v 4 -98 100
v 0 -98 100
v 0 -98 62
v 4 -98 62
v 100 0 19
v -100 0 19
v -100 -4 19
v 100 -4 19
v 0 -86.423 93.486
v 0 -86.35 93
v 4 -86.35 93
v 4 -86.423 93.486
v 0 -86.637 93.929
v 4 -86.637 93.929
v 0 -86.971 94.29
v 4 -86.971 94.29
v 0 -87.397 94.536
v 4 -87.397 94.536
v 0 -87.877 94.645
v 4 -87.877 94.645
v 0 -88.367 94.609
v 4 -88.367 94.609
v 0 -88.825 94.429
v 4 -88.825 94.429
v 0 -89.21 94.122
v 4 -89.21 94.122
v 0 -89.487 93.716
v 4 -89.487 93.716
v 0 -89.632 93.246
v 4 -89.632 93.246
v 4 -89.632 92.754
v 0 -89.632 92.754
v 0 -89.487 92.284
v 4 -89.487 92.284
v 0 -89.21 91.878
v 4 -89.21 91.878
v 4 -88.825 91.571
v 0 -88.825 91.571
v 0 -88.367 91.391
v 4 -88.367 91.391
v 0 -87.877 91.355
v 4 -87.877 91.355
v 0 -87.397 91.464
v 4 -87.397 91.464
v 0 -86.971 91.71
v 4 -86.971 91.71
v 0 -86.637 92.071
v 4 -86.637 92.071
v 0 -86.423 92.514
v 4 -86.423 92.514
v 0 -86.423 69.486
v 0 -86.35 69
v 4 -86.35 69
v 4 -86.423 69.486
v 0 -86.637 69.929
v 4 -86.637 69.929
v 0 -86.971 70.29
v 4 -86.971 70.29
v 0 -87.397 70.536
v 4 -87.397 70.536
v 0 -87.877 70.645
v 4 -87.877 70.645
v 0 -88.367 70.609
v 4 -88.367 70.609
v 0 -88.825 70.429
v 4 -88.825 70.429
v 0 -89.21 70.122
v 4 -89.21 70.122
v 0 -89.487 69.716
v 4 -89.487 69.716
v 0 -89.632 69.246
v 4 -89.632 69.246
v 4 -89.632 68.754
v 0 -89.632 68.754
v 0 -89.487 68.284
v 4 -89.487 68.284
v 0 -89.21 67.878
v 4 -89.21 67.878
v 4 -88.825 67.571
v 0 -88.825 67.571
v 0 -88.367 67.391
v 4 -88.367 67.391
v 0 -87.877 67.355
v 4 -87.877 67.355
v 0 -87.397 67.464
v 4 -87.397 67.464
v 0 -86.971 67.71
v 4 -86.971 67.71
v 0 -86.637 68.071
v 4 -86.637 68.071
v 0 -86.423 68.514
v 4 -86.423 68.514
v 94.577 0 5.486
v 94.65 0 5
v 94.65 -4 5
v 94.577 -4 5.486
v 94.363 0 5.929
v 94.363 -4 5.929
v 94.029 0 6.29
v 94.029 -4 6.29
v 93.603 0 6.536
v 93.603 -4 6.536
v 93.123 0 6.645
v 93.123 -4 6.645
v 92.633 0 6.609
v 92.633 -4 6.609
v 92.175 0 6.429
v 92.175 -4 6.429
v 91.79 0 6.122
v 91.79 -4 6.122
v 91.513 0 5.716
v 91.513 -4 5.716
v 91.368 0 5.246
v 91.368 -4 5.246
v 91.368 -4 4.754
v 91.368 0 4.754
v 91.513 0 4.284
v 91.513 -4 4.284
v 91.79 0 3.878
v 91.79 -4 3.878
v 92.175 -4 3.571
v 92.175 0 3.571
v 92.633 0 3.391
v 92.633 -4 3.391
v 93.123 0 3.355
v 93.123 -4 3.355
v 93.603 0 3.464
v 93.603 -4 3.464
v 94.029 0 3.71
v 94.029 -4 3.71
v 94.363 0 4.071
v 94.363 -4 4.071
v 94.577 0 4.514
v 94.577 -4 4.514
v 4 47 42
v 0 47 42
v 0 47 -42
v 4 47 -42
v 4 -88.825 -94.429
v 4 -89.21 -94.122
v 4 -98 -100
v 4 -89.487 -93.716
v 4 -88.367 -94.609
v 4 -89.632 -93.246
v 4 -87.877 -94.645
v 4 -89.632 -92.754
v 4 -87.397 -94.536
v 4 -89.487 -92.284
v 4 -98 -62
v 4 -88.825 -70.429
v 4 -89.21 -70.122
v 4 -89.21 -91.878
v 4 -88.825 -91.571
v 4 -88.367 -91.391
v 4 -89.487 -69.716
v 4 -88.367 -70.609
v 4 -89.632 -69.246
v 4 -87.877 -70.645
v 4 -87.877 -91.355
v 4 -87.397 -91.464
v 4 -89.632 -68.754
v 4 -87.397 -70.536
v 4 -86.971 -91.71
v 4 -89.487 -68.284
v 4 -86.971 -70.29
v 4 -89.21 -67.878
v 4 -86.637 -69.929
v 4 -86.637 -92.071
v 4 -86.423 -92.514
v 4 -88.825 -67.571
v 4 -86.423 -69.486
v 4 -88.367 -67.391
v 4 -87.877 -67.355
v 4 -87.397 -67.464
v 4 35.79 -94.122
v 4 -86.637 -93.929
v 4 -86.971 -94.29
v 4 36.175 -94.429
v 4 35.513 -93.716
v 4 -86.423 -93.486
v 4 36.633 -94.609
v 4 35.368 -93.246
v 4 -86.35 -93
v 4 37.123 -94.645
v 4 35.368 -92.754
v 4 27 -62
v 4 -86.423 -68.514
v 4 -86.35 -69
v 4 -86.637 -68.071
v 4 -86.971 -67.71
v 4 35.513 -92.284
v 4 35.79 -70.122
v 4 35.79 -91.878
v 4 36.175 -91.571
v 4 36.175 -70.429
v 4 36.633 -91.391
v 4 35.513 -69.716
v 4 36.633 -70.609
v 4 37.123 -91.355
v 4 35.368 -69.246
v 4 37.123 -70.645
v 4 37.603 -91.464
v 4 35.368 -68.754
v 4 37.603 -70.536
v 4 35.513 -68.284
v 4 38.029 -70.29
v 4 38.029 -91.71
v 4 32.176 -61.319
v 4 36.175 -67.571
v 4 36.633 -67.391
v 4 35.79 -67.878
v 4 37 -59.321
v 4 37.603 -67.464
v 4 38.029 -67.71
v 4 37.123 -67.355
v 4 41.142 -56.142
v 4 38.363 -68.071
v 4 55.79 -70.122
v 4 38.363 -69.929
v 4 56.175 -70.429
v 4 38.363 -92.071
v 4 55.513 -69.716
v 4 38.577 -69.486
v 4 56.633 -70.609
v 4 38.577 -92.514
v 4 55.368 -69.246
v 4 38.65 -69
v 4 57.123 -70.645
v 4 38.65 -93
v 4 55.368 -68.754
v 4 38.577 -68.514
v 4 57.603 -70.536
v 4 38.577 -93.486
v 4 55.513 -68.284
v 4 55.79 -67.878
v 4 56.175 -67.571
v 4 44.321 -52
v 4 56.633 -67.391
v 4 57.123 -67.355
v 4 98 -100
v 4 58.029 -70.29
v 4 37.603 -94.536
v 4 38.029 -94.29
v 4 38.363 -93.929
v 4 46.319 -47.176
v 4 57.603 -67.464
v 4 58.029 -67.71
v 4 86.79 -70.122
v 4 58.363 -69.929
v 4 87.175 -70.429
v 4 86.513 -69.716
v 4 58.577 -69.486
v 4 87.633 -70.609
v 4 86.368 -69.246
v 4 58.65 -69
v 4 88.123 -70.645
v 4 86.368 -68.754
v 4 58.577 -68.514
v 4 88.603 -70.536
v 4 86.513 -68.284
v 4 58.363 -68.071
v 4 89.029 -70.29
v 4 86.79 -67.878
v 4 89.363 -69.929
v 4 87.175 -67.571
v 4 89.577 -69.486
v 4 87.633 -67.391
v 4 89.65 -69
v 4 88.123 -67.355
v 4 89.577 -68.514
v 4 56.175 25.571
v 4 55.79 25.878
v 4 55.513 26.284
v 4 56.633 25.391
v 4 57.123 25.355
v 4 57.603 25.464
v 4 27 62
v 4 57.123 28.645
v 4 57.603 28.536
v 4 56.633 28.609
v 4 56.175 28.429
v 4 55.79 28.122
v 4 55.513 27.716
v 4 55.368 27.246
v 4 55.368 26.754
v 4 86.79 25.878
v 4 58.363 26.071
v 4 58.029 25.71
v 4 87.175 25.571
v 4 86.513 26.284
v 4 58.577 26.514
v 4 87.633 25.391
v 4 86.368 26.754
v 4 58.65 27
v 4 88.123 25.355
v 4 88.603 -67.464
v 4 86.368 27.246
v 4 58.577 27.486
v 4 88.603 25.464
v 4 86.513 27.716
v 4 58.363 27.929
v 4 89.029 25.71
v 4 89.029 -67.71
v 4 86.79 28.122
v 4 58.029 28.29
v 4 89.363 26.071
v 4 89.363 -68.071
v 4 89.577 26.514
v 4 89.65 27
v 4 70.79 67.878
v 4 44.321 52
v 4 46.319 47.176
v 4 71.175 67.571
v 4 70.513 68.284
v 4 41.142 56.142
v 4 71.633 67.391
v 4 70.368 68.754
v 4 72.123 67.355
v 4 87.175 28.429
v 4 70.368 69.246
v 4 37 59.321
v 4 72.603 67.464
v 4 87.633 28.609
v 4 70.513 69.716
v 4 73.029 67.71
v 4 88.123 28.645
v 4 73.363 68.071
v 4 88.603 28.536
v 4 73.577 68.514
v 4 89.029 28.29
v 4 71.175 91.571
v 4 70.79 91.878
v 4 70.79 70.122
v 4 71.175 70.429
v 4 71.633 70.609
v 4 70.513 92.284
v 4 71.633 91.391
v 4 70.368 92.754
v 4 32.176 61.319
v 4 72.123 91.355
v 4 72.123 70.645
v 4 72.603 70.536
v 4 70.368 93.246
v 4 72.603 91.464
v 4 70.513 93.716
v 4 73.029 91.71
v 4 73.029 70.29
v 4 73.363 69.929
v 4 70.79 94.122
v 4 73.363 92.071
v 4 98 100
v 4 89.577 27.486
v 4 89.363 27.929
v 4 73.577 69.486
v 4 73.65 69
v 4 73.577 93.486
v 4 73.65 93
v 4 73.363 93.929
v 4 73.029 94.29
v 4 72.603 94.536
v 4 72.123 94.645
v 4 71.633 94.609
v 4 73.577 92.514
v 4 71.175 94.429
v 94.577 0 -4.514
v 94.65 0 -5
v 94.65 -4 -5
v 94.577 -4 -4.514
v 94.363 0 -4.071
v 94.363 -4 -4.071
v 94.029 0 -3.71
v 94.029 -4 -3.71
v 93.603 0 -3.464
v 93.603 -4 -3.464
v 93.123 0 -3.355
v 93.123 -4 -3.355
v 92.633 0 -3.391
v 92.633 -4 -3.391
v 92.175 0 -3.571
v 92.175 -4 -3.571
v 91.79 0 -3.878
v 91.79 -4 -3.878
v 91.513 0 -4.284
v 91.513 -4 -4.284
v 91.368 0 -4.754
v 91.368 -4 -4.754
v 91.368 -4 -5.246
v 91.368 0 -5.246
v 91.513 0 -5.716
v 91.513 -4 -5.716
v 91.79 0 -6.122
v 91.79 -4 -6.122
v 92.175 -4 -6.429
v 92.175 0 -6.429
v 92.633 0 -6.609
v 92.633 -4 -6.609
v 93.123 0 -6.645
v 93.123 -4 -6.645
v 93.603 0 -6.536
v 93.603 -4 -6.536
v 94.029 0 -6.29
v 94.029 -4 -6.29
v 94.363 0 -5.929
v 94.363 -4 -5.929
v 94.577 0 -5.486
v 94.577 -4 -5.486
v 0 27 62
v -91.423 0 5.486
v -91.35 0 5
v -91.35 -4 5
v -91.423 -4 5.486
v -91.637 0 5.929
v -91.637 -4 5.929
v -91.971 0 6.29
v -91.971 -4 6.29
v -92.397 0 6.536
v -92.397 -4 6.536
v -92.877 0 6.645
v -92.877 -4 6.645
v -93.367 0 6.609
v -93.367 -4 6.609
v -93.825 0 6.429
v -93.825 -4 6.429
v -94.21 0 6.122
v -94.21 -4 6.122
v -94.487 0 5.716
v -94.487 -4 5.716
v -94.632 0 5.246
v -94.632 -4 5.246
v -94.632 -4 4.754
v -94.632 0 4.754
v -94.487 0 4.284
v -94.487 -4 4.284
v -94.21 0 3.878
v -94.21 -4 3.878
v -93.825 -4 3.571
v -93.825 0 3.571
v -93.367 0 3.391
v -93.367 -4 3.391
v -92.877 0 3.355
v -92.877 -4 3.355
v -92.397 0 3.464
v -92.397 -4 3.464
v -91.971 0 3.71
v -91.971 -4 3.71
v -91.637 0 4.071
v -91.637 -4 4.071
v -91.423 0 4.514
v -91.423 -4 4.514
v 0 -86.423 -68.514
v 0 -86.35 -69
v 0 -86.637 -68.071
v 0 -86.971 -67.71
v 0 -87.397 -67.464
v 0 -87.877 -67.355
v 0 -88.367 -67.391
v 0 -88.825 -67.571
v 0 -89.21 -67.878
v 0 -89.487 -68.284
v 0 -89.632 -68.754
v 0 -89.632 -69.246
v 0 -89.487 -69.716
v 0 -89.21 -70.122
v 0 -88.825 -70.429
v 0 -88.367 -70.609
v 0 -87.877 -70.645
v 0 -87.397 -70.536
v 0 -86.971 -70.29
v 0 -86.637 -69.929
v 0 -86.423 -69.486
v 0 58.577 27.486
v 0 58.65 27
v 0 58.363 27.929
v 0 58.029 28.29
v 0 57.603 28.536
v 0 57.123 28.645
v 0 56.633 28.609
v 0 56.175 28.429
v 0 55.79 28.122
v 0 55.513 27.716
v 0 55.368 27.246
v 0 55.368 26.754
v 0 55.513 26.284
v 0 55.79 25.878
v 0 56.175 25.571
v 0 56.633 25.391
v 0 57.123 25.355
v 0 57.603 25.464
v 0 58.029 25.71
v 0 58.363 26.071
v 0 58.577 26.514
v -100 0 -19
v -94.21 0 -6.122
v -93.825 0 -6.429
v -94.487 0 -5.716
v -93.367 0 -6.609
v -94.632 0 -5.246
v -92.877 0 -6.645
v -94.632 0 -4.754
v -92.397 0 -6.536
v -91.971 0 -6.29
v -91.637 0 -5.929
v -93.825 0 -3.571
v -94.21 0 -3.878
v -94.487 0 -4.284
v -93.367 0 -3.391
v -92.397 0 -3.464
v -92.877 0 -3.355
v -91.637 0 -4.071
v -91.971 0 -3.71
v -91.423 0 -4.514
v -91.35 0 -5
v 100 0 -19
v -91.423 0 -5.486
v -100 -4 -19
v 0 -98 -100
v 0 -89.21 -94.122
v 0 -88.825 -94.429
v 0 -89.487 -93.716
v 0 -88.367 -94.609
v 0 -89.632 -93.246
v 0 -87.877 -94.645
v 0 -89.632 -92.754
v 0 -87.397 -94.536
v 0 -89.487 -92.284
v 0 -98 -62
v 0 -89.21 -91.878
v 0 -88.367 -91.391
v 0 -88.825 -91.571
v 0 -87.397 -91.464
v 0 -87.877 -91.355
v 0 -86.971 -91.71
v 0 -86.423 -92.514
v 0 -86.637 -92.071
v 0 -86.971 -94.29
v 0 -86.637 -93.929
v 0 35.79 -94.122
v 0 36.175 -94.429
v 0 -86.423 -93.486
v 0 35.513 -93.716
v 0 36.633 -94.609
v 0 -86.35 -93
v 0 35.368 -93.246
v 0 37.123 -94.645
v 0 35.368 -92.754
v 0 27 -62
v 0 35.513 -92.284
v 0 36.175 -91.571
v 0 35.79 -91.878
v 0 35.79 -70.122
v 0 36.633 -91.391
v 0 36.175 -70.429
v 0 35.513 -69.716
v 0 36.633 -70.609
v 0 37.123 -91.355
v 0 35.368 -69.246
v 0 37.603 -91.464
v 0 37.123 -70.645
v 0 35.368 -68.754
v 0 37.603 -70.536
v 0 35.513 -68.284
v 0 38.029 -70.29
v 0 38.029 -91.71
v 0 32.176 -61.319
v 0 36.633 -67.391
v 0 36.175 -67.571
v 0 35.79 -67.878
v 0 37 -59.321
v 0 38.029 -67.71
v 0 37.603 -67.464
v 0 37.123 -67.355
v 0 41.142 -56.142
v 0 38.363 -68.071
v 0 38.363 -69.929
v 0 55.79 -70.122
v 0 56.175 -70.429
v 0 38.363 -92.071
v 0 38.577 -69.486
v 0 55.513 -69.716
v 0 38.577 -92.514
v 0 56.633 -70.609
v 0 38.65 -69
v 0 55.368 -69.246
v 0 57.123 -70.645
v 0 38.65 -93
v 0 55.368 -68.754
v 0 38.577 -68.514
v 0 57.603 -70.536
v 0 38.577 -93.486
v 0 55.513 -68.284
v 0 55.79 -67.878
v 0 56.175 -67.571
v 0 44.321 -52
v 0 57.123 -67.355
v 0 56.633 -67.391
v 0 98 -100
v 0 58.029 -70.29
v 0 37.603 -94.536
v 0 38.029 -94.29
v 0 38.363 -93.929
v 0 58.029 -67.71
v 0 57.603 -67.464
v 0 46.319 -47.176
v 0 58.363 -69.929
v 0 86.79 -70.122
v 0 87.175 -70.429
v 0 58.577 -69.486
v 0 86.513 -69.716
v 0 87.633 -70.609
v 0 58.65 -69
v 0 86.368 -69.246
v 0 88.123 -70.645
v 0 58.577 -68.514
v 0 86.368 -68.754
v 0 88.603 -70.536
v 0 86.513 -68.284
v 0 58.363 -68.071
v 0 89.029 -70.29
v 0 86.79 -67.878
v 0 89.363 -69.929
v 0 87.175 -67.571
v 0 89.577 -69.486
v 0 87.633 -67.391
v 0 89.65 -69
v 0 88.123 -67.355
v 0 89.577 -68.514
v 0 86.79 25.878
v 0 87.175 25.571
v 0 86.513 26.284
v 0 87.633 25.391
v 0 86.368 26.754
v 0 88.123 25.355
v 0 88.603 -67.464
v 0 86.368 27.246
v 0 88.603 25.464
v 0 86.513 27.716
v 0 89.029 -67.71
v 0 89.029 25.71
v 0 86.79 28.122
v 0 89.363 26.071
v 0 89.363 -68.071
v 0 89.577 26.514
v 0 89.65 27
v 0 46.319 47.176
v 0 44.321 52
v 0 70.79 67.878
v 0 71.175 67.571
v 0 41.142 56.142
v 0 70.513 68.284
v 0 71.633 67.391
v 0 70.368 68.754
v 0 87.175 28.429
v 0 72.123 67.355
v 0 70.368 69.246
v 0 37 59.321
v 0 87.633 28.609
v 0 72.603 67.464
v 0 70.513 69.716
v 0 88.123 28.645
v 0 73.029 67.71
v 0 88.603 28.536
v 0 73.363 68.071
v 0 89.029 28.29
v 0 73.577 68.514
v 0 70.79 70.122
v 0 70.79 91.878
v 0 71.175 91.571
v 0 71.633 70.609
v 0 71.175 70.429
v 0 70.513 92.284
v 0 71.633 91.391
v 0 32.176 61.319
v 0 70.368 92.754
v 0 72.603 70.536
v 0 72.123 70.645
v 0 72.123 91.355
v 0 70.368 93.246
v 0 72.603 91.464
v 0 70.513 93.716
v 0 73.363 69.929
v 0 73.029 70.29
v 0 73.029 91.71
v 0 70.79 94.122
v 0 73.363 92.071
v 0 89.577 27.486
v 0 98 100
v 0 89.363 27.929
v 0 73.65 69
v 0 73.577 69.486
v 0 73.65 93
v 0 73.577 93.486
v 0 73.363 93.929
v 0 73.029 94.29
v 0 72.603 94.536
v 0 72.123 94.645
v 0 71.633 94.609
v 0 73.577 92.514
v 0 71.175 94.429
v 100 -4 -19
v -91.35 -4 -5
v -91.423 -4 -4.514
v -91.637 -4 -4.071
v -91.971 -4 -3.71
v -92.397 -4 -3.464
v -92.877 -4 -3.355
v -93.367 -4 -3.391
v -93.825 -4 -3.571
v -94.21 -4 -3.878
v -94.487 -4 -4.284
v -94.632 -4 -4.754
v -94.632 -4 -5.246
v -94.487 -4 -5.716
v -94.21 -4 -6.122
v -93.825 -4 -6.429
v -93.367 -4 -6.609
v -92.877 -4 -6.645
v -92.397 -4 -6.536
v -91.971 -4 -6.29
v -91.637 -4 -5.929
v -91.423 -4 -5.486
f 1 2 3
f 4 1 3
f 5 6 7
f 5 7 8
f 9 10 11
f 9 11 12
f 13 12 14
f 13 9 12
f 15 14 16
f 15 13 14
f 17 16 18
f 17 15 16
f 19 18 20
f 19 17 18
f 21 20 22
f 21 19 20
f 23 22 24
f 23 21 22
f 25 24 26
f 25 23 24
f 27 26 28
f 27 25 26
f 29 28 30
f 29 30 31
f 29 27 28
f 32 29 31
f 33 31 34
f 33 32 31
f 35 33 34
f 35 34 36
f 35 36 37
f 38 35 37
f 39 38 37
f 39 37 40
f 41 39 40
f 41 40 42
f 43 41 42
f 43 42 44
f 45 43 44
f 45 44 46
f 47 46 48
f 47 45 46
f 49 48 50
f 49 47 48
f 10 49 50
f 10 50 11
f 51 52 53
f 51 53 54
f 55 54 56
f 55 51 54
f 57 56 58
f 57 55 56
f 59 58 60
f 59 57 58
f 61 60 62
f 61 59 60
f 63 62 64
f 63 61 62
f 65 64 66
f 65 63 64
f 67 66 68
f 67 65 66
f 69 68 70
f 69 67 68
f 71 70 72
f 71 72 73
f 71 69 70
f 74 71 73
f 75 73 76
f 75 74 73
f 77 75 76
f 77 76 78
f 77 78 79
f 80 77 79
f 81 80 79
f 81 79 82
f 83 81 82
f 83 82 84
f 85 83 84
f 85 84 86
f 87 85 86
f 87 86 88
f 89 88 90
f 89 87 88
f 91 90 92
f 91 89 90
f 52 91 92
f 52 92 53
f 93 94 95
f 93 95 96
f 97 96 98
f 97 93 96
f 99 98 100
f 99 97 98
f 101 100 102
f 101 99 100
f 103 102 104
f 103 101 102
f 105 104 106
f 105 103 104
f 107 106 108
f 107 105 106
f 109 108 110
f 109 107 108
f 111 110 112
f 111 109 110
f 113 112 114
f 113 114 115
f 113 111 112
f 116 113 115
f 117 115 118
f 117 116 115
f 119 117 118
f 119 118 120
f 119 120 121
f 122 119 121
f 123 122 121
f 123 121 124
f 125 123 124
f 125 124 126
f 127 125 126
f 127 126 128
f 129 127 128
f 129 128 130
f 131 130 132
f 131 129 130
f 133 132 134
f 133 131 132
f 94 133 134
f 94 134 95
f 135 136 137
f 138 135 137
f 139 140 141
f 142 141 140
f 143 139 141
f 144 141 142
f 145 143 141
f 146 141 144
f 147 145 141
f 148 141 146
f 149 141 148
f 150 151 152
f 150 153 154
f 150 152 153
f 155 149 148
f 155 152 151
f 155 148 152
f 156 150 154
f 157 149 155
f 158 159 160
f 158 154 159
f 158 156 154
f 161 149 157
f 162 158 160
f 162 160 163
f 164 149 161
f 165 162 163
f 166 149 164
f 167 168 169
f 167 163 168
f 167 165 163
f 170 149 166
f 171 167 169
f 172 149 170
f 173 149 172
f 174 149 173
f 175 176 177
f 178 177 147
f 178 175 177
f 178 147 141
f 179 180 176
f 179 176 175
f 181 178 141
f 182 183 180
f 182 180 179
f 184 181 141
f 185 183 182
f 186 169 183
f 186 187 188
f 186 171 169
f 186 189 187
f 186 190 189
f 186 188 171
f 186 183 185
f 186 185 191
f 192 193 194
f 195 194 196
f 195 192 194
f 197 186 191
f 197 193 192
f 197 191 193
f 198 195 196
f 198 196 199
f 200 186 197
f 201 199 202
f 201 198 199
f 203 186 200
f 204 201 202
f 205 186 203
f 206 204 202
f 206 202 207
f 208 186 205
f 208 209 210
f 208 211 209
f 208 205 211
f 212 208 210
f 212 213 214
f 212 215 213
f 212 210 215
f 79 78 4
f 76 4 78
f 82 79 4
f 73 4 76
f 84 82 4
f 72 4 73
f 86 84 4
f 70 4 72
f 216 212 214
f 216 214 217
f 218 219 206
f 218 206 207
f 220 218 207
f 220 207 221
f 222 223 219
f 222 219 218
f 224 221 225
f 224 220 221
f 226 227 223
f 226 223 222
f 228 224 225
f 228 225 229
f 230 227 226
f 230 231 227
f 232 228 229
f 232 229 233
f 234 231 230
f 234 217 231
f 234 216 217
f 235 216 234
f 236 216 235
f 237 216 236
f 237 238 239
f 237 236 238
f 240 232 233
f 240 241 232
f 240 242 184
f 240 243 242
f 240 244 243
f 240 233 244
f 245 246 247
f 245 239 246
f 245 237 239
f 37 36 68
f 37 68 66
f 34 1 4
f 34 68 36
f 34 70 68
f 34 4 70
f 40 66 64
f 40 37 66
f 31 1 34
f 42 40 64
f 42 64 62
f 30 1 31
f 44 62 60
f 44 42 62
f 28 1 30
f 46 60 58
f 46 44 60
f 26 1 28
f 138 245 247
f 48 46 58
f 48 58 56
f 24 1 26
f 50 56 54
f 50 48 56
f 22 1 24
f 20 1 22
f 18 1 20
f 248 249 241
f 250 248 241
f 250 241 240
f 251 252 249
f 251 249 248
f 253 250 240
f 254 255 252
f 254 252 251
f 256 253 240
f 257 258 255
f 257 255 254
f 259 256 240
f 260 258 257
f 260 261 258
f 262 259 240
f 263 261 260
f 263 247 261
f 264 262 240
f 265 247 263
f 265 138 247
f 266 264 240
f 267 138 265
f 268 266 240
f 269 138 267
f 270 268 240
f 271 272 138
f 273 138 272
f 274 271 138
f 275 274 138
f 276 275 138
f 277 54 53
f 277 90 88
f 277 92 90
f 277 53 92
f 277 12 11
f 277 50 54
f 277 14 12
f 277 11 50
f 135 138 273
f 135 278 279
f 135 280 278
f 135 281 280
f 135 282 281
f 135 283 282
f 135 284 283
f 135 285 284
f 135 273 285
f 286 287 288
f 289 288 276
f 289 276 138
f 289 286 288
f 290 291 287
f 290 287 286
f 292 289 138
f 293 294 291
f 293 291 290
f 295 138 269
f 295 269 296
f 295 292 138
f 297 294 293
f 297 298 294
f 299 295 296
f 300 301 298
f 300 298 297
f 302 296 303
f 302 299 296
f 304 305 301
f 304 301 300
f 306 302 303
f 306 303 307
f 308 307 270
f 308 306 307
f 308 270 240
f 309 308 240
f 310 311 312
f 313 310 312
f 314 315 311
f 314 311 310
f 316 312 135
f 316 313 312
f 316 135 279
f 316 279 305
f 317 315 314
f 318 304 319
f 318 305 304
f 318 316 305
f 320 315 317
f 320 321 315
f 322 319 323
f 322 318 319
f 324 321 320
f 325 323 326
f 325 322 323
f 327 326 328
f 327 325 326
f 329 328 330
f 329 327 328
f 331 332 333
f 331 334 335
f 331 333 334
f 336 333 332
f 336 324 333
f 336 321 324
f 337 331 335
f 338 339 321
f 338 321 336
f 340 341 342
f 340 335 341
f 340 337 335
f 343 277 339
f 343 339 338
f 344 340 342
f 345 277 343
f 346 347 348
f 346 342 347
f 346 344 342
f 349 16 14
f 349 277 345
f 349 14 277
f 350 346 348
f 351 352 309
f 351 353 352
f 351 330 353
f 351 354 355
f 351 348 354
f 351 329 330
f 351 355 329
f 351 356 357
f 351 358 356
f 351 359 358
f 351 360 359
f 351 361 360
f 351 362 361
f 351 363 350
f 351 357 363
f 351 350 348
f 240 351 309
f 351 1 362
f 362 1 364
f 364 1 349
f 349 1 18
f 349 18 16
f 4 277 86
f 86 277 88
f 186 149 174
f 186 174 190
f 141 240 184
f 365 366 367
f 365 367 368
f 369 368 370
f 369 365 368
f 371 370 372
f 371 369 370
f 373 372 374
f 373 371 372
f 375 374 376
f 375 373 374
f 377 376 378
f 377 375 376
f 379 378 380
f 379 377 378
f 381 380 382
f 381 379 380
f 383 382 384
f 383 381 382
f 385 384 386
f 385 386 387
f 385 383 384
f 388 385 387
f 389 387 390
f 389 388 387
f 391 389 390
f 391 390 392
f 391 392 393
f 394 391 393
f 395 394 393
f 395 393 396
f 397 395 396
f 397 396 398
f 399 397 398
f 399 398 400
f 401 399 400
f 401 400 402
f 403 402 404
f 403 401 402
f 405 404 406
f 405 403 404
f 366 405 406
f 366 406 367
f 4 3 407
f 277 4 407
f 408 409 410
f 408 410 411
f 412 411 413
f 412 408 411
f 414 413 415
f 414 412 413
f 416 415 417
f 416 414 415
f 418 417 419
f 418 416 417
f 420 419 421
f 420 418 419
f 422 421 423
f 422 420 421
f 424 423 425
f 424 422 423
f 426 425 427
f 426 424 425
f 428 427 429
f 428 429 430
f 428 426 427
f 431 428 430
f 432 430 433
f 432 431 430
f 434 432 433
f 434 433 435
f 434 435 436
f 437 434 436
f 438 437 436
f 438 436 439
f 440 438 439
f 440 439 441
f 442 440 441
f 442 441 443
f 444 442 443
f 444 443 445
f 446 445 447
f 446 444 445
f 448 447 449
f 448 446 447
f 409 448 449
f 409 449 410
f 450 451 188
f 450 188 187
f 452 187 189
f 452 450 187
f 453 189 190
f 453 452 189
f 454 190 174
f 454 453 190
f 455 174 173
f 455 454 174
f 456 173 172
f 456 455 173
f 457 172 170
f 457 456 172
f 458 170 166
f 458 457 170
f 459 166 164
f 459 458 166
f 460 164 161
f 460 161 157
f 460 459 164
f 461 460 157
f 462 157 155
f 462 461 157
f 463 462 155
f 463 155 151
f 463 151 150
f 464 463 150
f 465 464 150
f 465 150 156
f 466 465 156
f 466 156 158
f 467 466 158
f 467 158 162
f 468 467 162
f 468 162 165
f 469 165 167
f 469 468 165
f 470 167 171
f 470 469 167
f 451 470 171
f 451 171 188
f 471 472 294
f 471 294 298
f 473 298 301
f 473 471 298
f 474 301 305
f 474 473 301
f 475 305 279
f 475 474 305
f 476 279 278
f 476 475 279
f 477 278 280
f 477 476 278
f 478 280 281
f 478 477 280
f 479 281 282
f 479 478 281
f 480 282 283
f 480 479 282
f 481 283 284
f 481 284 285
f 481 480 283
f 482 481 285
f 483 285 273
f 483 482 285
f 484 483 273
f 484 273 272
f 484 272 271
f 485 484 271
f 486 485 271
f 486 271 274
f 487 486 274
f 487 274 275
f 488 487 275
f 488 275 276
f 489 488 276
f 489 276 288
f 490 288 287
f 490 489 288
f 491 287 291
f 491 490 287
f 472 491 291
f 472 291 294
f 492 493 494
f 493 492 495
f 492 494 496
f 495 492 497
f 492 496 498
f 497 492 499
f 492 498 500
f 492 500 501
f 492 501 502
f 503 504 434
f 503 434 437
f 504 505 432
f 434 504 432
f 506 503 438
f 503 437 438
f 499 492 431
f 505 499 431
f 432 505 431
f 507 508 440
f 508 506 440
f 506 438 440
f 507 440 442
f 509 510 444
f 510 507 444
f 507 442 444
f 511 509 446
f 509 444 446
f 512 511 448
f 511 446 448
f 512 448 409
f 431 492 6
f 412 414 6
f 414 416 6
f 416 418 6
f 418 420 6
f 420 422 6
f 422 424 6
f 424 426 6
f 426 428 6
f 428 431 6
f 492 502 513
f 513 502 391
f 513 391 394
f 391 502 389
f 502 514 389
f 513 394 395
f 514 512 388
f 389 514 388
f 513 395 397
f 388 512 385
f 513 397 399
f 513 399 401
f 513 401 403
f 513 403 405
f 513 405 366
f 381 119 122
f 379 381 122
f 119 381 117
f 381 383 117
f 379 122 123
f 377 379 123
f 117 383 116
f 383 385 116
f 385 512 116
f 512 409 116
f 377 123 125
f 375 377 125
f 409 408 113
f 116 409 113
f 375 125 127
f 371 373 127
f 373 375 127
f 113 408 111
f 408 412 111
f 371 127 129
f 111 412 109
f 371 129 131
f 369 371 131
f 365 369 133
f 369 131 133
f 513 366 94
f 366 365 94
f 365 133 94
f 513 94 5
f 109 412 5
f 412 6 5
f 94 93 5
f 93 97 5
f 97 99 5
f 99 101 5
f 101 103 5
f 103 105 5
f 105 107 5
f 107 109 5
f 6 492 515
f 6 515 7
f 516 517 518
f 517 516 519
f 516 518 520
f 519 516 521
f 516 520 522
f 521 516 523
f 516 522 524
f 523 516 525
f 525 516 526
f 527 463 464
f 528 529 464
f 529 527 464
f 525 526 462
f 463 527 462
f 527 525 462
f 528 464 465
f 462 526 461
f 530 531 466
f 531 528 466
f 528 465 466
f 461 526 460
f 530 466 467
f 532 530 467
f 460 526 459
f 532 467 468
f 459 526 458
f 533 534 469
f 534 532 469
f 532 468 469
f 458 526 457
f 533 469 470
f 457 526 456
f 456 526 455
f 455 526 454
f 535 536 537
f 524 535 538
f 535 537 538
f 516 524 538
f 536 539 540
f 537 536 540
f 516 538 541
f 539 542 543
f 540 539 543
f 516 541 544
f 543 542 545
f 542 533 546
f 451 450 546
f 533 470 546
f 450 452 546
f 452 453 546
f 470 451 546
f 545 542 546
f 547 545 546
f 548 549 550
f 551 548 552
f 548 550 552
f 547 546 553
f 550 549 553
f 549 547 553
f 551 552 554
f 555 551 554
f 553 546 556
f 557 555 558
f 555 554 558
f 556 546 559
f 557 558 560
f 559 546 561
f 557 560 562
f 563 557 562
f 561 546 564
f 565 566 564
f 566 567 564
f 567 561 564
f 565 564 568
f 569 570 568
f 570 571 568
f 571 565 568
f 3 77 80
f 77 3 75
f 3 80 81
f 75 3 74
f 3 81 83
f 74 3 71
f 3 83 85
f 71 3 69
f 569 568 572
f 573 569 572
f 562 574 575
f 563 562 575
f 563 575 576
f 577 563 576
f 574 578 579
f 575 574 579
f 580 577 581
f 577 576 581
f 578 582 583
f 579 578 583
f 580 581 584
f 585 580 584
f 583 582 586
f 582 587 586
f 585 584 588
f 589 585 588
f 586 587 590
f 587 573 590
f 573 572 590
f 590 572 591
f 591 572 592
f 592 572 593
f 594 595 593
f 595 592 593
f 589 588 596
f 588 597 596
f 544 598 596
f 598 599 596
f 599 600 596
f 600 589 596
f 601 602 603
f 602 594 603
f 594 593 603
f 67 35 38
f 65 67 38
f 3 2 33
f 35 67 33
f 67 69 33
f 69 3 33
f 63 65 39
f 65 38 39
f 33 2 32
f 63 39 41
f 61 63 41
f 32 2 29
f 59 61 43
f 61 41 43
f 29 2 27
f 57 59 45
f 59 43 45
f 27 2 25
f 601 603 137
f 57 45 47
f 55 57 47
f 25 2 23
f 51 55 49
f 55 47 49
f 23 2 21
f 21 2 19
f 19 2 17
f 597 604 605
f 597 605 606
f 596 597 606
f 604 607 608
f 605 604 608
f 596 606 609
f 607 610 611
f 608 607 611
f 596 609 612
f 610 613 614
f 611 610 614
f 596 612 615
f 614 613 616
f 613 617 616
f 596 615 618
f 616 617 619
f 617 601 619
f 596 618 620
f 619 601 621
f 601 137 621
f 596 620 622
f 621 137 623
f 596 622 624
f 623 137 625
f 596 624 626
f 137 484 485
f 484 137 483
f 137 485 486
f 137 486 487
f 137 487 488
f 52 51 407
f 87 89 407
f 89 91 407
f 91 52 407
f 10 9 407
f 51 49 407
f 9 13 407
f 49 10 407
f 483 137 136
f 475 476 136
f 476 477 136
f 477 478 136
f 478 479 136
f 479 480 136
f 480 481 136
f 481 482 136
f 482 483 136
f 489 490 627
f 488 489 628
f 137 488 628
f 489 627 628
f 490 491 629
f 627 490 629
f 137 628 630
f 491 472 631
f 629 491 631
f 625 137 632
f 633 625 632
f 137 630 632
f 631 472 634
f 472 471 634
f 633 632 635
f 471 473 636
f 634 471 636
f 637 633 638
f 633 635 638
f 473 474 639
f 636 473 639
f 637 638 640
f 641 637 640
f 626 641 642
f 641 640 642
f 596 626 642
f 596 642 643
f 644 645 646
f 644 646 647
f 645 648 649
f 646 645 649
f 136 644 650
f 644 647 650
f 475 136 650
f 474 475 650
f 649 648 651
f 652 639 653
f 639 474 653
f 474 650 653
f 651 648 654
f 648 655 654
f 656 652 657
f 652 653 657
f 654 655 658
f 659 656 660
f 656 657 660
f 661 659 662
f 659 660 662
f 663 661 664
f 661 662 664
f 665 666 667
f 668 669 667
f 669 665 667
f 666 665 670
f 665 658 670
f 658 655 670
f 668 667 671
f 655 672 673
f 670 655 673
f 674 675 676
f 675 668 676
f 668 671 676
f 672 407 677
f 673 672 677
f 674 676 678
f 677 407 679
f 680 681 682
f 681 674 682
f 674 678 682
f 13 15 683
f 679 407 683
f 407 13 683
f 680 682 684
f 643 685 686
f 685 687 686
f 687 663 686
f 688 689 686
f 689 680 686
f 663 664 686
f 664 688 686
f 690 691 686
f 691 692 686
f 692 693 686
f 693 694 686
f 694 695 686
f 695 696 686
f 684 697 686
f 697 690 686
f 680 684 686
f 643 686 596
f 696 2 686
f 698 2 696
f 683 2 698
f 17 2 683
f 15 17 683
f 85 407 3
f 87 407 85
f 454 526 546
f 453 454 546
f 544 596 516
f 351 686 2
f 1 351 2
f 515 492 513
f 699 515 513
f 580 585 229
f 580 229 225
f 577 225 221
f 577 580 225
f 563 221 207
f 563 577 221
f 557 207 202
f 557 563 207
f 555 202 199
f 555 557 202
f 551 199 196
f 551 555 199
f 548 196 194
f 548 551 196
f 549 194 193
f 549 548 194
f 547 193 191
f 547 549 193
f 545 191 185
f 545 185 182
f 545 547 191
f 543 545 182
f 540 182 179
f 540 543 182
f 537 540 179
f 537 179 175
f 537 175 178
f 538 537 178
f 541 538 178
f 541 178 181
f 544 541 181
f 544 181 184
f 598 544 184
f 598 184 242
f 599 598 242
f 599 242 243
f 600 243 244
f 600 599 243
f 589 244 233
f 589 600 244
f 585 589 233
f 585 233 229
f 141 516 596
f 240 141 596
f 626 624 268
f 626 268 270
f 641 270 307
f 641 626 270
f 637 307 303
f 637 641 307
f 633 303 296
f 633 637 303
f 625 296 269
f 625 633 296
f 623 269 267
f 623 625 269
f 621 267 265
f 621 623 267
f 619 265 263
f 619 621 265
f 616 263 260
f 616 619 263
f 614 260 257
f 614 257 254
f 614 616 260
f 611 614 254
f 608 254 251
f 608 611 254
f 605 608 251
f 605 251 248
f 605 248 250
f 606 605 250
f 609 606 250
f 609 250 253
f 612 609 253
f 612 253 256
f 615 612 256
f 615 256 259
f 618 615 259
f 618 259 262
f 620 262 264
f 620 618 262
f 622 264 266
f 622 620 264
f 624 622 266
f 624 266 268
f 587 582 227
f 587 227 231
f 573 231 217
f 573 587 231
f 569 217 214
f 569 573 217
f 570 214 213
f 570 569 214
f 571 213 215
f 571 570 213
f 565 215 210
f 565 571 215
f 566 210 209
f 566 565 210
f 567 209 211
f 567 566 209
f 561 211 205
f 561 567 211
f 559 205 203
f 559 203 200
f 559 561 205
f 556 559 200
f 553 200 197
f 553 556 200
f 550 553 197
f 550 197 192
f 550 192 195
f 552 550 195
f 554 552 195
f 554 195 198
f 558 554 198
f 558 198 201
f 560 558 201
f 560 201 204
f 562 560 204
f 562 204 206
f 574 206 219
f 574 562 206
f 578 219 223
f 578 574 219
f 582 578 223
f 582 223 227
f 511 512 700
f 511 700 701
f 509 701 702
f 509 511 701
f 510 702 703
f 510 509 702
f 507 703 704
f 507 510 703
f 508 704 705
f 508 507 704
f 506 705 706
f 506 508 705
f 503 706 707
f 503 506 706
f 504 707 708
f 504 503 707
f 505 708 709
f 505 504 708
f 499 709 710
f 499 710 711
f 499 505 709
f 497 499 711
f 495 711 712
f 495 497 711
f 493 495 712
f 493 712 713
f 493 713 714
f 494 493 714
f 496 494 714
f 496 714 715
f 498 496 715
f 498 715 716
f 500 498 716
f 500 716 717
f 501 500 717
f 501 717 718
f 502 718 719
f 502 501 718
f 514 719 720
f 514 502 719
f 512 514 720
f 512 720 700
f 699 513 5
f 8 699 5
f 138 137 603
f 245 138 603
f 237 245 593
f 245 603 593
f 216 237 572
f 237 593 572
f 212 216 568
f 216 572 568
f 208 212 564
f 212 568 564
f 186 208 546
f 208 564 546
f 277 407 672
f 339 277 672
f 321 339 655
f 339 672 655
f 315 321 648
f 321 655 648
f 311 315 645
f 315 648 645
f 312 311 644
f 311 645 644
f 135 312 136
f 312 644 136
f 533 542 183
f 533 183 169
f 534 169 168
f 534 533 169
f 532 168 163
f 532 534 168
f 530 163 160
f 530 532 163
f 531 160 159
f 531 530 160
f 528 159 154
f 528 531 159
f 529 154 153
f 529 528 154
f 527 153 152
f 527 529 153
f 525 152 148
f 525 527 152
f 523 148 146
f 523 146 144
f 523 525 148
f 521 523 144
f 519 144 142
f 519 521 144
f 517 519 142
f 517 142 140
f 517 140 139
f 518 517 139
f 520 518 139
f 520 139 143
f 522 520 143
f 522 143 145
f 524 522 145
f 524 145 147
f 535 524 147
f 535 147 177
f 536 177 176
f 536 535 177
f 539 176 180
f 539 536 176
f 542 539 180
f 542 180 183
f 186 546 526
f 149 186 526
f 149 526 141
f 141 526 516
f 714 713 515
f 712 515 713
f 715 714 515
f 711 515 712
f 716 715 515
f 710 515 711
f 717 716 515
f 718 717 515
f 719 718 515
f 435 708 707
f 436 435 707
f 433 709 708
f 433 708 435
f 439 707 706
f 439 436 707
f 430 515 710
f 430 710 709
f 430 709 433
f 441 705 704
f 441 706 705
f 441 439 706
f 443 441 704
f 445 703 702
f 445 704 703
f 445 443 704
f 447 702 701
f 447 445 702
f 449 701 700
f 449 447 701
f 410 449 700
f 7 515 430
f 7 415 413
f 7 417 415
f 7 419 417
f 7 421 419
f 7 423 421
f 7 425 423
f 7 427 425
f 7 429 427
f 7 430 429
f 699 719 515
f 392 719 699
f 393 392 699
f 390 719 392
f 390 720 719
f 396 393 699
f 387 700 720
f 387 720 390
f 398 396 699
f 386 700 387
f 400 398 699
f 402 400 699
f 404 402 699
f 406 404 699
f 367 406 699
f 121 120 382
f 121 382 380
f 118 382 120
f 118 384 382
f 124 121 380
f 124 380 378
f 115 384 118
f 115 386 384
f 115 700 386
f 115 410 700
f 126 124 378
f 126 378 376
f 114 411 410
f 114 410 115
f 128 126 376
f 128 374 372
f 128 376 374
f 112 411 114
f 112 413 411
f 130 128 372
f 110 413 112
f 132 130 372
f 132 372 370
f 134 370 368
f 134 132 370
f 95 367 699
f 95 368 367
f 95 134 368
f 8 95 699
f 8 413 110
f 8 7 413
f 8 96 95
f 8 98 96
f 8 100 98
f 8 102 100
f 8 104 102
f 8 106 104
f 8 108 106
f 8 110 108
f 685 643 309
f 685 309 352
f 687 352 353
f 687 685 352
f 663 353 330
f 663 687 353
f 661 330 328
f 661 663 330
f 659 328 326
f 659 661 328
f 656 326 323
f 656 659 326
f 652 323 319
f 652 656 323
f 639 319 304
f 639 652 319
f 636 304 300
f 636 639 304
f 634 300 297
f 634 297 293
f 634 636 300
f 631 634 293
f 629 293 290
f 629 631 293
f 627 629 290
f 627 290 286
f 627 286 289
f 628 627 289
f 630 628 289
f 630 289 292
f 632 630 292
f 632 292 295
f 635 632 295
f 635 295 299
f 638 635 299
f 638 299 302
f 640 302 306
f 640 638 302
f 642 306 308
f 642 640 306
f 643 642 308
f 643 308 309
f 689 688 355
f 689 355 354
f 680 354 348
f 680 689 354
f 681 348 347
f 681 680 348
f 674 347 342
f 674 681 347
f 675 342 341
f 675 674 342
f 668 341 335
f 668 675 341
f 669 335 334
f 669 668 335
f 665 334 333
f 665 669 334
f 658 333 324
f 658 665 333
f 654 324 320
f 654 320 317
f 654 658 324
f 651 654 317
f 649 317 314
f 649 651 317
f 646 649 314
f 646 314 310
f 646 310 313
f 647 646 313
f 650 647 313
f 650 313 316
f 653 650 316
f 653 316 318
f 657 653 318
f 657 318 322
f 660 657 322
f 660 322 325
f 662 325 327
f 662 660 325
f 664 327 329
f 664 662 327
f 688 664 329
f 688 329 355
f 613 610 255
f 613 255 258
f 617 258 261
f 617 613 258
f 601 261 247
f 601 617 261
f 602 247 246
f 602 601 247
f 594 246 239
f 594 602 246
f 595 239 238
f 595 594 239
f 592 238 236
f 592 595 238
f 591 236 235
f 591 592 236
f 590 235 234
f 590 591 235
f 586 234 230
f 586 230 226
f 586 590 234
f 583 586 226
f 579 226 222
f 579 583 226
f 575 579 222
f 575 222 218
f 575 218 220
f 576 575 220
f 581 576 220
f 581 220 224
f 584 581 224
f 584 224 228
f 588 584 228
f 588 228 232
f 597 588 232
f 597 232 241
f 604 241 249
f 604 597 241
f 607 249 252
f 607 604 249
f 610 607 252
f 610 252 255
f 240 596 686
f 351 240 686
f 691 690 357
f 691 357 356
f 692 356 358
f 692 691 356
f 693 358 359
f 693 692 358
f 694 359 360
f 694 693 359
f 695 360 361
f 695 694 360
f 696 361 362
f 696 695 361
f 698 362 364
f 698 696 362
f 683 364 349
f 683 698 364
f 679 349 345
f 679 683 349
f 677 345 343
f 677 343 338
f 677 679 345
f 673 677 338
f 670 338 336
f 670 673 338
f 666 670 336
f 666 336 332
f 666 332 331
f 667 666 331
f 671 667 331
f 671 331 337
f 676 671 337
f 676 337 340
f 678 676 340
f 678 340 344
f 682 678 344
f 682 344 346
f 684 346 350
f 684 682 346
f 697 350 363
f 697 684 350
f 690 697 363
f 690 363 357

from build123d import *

# Parameters (mm, degrees)
F0_W     = 200
F0_H     = 38
F0_R     = 1.65
F1_DEPTH = 4
F2_R     = 1.65
F3_DEPTH = 4


with BuildPart() as f1:
    # F0 (on Front) → F1 (new body)
    with BuildSketch(Plane.XZ):
        Rectangle(F0_W, F0_H)
        with Locations((-93, -5)):
            Circle(F0_R, mode=Mode.SUBTRACT)
        with Locations((-93, 5)):
            Circle(F0_R, mode=Mode.SUBTRACT)
        with Locations((93, -5)):
            Circle(F0_R, mode=Mode.SUBTRACT)
        with Locations((93, 5)):
            Circle(F0_R, mode=Mode.SUBTRACT)
    extrude(amount=F1_DEPTH)


with BuildPart() as f3:
    # F2 (on Right) → F3 (new body)
    with BuildSketch(Plane.YZ):
        with BuildLine():
            Line((98, -100), (98, 100))
            Line((98, 100), (-98, 100))
            Line((-98, 100), (-98, 62))
            Line((-98, 62), (27, 62))
            ThreePointArc((27, 62), (41.142136, 56.142136), (47, 42))
            Line((47, 42), (47, -42))
            ThreePointArc((47, -42), (41.142136, -56.142136), (27, -62))
            Line((27, -62), (-98, -62))
            Line((-98, -62), (-98, -100))
            Line((-98, -100), (98, -100))
        make_face()
        with Locations((-88, -93)):
            Circle(F2_R, mode=Mode.SUBTRACT)
        with Locations((-88, -69)):
            Circle(F2_R, mode=Mode.SUBTRACT)
        with Locations((37, -93)):
            Circle(F2_R, mode=Mode.SUBTRACT)
        with Locations((37, -69)):
            Circle(F2_R, mode=Mode.SUBTRACT)
        with Locations((57, -69)):
            Circle(F2_R, mode=Mode.SUBTRACT)
        with Locations((88, -69)):
            Circle(F2_R, mode=Mode.SUBTRACT)
        with Locations((-88, 69)):
            Circle(F2_R, mode=Mode.SUBTRACT)
        with Locations((-88, 93)):
            Circle(F2_R, mode=Mode.SUBTRACT)
        with Locations((57, 27)):
            Circle(F2_R, mode=Mode.SUBTRACT)
        with Locations((88, 27)):
            Circle(F2_R, mode=Mode.SUBTRACT)
        with Locations((72, 69)):
            Circle(F2_R, mode=Mode.SUBTRACT)
        with Locations((72, 93)):
            Circle(F2_R, mode=Mode.SUBTRACT)
    extrude(amount=F3_DEPTH)


solid = Compound([f1.part, f3.part])
